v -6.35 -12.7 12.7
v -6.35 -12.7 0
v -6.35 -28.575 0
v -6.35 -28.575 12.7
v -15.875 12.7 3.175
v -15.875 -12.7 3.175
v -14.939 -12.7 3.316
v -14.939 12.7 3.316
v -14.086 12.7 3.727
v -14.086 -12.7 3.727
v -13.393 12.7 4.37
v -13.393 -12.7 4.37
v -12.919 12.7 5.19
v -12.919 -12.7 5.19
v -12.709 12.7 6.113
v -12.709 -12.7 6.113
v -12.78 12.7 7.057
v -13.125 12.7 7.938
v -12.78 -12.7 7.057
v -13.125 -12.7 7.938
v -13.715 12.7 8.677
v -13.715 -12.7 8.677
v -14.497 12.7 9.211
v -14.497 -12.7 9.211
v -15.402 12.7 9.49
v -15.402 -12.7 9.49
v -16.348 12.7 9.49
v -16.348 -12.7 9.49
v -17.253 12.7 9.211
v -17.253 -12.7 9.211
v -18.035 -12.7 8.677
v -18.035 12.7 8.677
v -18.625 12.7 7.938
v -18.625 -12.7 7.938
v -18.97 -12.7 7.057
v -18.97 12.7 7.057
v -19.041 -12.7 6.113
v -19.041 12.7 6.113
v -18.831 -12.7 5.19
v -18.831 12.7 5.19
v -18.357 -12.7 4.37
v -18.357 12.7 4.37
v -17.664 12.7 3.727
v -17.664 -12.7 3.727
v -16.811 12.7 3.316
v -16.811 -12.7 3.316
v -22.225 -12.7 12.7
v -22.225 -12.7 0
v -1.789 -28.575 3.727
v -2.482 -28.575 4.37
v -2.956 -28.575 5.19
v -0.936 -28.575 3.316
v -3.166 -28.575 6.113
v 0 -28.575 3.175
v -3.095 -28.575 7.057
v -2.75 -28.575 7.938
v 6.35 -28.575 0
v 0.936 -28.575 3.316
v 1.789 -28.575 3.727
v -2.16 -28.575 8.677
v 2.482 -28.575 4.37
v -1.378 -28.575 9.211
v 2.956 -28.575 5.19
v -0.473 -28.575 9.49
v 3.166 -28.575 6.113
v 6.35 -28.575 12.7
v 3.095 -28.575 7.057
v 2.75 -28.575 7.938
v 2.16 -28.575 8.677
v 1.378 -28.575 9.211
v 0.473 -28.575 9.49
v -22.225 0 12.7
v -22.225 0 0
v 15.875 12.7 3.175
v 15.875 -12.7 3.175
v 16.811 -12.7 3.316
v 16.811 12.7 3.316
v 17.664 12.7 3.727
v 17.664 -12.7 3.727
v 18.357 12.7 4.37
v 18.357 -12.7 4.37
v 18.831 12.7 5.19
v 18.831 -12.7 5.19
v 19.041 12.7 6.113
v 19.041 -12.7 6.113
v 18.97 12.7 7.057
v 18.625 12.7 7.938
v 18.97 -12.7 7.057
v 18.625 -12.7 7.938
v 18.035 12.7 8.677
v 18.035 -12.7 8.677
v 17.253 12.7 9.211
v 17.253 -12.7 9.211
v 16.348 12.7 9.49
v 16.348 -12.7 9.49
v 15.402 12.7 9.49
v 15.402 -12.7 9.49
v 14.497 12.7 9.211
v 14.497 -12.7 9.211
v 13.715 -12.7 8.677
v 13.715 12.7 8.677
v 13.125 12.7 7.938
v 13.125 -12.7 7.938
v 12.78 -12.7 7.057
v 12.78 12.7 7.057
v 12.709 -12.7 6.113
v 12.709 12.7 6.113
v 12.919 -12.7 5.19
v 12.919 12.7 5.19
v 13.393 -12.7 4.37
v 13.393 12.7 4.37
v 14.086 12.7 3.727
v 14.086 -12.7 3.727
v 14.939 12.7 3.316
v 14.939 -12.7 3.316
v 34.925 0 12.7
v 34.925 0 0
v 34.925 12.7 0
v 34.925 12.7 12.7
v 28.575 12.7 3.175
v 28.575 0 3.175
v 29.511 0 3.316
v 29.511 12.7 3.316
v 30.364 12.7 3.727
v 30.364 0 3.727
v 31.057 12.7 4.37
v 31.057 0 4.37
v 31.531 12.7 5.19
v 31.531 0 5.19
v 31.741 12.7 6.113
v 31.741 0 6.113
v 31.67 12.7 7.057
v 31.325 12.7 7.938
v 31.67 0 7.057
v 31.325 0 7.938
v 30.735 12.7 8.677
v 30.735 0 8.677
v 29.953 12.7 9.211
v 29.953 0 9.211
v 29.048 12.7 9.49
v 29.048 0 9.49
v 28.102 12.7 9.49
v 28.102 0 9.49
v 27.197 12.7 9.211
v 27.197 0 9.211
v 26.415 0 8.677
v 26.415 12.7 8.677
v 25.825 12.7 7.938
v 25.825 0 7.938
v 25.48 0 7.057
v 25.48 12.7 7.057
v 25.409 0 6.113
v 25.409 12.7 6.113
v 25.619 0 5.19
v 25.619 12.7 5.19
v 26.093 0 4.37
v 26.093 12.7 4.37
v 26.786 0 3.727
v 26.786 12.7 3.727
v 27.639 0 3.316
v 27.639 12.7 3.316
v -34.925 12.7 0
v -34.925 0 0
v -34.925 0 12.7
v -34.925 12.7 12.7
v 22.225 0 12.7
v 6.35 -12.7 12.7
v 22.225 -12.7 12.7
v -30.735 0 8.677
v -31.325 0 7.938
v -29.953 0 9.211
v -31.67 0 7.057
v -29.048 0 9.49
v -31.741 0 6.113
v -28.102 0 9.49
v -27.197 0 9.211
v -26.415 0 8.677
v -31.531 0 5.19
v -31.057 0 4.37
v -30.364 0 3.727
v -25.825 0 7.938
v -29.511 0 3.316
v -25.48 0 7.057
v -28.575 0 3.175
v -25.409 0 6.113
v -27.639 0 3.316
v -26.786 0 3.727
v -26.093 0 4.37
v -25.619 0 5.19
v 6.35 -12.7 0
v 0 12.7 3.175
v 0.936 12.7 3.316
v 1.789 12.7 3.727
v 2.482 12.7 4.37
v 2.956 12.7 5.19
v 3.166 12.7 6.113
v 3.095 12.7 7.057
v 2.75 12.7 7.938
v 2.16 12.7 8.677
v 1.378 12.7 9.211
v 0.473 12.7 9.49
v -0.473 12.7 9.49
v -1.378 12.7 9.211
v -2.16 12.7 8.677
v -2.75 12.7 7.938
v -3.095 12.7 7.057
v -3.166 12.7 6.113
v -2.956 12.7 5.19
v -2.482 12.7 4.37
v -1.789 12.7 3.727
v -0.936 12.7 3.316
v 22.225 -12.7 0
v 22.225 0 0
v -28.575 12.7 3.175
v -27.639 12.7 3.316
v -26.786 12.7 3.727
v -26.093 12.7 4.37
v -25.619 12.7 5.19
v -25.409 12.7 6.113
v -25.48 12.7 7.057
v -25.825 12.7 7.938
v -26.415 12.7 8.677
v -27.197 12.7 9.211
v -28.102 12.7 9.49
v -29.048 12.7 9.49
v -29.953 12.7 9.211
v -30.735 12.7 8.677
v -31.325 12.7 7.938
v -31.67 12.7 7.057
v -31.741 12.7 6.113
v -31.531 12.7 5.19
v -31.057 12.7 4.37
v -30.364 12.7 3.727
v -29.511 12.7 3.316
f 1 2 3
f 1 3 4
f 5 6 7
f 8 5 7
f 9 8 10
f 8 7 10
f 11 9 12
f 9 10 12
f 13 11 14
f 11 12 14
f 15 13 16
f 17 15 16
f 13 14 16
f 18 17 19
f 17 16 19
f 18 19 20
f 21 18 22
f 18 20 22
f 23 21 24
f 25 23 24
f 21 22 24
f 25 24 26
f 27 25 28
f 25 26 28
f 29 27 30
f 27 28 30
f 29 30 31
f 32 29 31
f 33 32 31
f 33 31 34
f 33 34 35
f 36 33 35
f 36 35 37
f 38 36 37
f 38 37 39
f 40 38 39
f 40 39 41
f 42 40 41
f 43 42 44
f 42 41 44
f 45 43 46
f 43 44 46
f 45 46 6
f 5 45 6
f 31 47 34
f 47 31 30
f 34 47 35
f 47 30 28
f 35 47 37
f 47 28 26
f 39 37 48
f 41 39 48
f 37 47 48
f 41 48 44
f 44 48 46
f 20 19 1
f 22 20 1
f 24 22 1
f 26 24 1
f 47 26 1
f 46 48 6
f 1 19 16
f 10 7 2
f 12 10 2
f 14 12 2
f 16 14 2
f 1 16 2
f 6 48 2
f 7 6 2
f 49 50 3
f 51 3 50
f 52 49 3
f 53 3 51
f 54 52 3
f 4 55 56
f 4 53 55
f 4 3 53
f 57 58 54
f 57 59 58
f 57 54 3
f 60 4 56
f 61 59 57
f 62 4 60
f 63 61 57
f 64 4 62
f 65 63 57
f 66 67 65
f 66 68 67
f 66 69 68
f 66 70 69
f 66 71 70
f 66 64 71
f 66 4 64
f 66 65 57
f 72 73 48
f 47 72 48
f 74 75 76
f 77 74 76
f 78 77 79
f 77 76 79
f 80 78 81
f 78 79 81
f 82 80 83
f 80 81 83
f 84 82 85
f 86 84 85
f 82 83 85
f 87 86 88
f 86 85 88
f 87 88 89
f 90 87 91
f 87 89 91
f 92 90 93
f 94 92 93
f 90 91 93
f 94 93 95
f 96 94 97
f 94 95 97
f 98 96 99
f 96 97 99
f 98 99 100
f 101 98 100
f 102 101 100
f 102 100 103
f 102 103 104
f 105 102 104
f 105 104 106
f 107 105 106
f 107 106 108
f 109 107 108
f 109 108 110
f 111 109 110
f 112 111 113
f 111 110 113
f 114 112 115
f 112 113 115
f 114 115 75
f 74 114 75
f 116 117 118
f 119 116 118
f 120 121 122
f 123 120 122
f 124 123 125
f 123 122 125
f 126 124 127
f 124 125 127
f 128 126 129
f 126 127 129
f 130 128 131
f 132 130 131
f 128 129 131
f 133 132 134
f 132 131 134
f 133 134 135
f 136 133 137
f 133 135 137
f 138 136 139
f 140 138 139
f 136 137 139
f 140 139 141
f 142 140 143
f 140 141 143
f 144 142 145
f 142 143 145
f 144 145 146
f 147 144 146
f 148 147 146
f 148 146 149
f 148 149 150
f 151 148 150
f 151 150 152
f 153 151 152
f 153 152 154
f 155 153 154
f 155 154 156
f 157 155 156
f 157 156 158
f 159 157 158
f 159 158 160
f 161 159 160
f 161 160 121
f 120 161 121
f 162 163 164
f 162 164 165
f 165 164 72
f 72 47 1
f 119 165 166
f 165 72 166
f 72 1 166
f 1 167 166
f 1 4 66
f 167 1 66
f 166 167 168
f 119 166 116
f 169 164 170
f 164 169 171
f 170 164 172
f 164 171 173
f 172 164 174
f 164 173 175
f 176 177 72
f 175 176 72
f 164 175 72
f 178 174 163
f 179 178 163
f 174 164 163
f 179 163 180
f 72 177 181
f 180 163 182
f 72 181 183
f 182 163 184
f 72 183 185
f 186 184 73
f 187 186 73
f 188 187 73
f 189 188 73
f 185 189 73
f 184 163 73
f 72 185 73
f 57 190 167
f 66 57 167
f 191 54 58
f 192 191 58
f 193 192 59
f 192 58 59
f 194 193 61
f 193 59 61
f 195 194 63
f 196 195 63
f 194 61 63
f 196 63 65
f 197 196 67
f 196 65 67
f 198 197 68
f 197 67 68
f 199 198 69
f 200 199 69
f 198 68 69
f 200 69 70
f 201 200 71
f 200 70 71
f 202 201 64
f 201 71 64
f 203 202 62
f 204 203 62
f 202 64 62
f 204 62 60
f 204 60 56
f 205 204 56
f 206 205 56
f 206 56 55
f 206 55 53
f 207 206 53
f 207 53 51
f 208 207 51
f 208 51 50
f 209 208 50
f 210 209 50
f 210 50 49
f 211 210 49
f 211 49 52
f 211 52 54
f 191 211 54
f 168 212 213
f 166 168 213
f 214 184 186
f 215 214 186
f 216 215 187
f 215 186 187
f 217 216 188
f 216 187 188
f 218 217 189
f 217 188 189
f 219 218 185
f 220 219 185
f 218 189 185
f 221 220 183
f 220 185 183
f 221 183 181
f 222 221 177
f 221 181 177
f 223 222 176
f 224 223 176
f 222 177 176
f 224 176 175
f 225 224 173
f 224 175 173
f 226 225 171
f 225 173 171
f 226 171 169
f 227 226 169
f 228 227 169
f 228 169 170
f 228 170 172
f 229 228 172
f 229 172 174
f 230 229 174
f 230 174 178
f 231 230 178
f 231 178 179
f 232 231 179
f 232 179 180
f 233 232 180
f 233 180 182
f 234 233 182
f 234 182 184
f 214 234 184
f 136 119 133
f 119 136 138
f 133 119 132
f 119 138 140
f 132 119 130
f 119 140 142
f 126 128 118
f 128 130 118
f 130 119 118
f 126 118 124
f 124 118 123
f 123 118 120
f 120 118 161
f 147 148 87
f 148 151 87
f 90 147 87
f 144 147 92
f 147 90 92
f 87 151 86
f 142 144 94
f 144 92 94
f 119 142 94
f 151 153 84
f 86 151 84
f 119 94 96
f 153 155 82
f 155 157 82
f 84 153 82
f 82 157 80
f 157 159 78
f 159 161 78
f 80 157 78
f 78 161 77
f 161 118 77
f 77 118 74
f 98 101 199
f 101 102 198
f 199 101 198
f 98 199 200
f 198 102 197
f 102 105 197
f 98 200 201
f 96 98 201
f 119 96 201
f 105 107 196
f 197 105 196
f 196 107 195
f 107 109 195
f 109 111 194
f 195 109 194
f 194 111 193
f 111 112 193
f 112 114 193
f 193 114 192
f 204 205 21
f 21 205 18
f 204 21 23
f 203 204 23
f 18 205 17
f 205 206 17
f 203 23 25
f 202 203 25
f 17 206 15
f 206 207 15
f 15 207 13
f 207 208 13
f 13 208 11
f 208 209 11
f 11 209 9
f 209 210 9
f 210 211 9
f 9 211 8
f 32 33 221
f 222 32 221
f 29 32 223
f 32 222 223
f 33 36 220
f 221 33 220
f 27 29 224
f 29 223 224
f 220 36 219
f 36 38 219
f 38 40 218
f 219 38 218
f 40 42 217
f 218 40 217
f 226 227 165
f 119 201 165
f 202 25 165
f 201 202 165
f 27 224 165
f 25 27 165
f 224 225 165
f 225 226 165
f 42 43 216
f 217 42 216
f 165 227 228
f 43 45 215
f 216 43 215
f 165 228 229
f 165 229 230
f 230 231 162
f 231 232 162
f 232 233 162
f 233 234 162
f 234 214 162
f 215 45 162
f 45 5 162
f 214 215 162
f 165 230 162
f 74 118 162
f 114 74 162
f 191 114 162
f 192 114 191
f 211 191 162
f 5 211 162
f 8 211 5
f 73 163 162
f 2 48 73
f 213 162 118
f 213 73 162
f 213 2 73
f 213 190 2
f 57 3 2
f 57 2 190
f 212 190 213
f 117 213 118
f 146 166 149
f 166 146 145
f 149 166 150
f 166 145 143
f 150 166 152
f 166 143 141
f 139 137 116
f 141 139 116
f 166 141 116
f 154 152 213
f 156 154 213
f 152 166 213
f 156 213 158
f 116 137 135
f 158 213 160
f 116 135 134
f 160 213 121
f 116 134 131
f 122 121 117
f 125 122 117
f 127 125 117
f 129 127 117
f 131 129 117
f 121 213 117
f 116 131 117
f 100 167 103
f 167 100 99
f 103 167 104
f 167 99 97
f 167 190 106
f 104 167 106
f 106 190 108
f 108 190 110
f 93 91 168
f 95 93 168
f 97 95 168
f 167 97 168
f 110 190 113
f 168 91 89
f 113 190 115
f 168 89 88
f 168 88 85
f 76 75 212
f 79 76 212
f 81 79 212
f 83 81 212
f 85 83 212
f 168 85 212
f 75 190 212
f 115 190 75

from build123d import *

# Parameters (mm, degrees)
SKETCH1_W           = 44.45
SKETCH1_H           = 12.7
SKETCH1_W_2         = 12.7
BOSS_EXTRUDE1_DEPTH = 12.7
SKETCH2_R           = 3.175
CUT_EXTRUDE1_DEPTH  = 25.4
SKETCH3_R           = 3.175
CUT_EXTRUDE2_DEPTH  = 25.4
SKETCH4_W           = 12.7
SKETCH4_H           = 12.7
BOSS_EXTRUDE2_DEPTH = 15.875
BOSS_EXTRUDE3_START = 12.7
SKETCH5_W           = 44.45
SKETCH5_H           = 12.7
SKETCH5_R           = 3.175
BOSS_EXTRUDE3_DEPTH = 12.7
SKETCH6_W           = 44.45
SKETCH6_H           = 12.7
CUT_EXTRUDE3_DEPTH  = 12.7
CUT_EXTRUDE4_REACH  = 57.54
SKETCH7_R           = 3.175


with BuildPart() as part:
    # Sketch1 → Boss-Extrude1 (new body)
    with BuildSketch(Plane.XY):
        with Locations((0, -6.35)):
            Rectangle(SKETCH1_W, SKETCH1_H)
        with Locations((0, 6.35)):
            Rectangle(SKETCH1_W, SKETCH1_H)
        with Locations((-28.575, 6.35)):
            Rectangle(SKETCH1_W_2, SKETCH1_H)
        with Locations((28.575, 6.35)):
            Rectangle(SKETCH1_W_2, SKETCH1_H)
    extrude(amount=BOSS_EXTRUDE1_DEPTH)

    # Sketch2 → Cut-Extrude1 (cut)
    with BuildSketch(Plane.XZ.offset(12.7)):
        with Locations(Location((-15.875, 6.35, 0), (0, 0, 270))):
            Circle(SKETCH2_R)
        with Locations(Location((15.875, 6.35, 0), (0, 0, 270))):
            Circle(SKETCH2_R)
    extrude(amount=-CUT_EXTRUDE1_DEPTH, mode=Mode.SUBTRACT)

    # Sketch3 → Cut-Extrude2 (cut)
    with BuildSketch(Plane.XZ):
        with Locations(Location((-28.575, 6.35, 0), (0, 0, 270))):
            Circle(SKETCH3_R)
        with Locations(Location((28.575, 6.35, 0), (0, 0, 270))):
            Circle(SKETCH3_R)
    extrude(amount=-CUT_EXTRUDE2_DEPTH, mode=Mode.SUBTRACT)

    # Sketch4 → Boss-Extrude2 (add)
    with BuildSketch(Plane.XZ.offset(12.7)):
        with Locations((0, 6.35)):
            Rectangle(SKETCH4_W, SKETCH4_H)
    extrude(amount=BOSS_EXTRUDE2_DEPTH)

    # Sketch5 → Boss-Extrude3 (add)
    with BuildSketch(Plane.XZ.offset(28.575).offset(BOSS_EXTRUDE3_START)):
        with Locations((0, 6.35)):
            Rectangle(SKETCH5_W, SKETCH5_H)
        with Locations(Location((-15.875, 6.35, 0), (0, 0, 270))):
            Circle(SKETCH5_R, mode=Mode.SUBTRACT)
        with Locations(Location((15.875, 6.35, 0), (0, 0, 270))):
            Circle(SKETCH5_R, mode=Mode.SUBTRACT)
    extrude(amount=-BOSS_EXTRUDE3_DEPTH)

    # Sketch6 → Cut-Extrude3 (cut)
    with BuildSketch(Plane.XZ.offset(41.275)):
        with Locations((0, 6.35)):
            Rectangle(SKETCH6_W, SKETCH6_H)
    extrude(amount=-CUT_EXTRUDE3_DEPTH, mode=Mode.SUBTRACT)

    # Sketch7 → Cut-Extrude4 (cut, up to next)
    with BuildSketch(Plane.XZ.offset(28.575), mode=Mode.PRIVATE) as cut_extrude4_sk1:
        with Locations(Location((0, 6.35, 0), (0, 0, 270))):
            Circle(SKETCH7_R)
    cut_extrude4_tool1 = extrude(cut_extrude4_sk1.sketch, amount=-CUT_EXTRUDE4_REACH, mode=Mode.PRIVATE) & part.part
    add(cut_extrude4_tool1.solids().sort_by_distance((0, -28.575, 6.35))[0], mode=Mode.SUBTRACT)


solid = part.part
